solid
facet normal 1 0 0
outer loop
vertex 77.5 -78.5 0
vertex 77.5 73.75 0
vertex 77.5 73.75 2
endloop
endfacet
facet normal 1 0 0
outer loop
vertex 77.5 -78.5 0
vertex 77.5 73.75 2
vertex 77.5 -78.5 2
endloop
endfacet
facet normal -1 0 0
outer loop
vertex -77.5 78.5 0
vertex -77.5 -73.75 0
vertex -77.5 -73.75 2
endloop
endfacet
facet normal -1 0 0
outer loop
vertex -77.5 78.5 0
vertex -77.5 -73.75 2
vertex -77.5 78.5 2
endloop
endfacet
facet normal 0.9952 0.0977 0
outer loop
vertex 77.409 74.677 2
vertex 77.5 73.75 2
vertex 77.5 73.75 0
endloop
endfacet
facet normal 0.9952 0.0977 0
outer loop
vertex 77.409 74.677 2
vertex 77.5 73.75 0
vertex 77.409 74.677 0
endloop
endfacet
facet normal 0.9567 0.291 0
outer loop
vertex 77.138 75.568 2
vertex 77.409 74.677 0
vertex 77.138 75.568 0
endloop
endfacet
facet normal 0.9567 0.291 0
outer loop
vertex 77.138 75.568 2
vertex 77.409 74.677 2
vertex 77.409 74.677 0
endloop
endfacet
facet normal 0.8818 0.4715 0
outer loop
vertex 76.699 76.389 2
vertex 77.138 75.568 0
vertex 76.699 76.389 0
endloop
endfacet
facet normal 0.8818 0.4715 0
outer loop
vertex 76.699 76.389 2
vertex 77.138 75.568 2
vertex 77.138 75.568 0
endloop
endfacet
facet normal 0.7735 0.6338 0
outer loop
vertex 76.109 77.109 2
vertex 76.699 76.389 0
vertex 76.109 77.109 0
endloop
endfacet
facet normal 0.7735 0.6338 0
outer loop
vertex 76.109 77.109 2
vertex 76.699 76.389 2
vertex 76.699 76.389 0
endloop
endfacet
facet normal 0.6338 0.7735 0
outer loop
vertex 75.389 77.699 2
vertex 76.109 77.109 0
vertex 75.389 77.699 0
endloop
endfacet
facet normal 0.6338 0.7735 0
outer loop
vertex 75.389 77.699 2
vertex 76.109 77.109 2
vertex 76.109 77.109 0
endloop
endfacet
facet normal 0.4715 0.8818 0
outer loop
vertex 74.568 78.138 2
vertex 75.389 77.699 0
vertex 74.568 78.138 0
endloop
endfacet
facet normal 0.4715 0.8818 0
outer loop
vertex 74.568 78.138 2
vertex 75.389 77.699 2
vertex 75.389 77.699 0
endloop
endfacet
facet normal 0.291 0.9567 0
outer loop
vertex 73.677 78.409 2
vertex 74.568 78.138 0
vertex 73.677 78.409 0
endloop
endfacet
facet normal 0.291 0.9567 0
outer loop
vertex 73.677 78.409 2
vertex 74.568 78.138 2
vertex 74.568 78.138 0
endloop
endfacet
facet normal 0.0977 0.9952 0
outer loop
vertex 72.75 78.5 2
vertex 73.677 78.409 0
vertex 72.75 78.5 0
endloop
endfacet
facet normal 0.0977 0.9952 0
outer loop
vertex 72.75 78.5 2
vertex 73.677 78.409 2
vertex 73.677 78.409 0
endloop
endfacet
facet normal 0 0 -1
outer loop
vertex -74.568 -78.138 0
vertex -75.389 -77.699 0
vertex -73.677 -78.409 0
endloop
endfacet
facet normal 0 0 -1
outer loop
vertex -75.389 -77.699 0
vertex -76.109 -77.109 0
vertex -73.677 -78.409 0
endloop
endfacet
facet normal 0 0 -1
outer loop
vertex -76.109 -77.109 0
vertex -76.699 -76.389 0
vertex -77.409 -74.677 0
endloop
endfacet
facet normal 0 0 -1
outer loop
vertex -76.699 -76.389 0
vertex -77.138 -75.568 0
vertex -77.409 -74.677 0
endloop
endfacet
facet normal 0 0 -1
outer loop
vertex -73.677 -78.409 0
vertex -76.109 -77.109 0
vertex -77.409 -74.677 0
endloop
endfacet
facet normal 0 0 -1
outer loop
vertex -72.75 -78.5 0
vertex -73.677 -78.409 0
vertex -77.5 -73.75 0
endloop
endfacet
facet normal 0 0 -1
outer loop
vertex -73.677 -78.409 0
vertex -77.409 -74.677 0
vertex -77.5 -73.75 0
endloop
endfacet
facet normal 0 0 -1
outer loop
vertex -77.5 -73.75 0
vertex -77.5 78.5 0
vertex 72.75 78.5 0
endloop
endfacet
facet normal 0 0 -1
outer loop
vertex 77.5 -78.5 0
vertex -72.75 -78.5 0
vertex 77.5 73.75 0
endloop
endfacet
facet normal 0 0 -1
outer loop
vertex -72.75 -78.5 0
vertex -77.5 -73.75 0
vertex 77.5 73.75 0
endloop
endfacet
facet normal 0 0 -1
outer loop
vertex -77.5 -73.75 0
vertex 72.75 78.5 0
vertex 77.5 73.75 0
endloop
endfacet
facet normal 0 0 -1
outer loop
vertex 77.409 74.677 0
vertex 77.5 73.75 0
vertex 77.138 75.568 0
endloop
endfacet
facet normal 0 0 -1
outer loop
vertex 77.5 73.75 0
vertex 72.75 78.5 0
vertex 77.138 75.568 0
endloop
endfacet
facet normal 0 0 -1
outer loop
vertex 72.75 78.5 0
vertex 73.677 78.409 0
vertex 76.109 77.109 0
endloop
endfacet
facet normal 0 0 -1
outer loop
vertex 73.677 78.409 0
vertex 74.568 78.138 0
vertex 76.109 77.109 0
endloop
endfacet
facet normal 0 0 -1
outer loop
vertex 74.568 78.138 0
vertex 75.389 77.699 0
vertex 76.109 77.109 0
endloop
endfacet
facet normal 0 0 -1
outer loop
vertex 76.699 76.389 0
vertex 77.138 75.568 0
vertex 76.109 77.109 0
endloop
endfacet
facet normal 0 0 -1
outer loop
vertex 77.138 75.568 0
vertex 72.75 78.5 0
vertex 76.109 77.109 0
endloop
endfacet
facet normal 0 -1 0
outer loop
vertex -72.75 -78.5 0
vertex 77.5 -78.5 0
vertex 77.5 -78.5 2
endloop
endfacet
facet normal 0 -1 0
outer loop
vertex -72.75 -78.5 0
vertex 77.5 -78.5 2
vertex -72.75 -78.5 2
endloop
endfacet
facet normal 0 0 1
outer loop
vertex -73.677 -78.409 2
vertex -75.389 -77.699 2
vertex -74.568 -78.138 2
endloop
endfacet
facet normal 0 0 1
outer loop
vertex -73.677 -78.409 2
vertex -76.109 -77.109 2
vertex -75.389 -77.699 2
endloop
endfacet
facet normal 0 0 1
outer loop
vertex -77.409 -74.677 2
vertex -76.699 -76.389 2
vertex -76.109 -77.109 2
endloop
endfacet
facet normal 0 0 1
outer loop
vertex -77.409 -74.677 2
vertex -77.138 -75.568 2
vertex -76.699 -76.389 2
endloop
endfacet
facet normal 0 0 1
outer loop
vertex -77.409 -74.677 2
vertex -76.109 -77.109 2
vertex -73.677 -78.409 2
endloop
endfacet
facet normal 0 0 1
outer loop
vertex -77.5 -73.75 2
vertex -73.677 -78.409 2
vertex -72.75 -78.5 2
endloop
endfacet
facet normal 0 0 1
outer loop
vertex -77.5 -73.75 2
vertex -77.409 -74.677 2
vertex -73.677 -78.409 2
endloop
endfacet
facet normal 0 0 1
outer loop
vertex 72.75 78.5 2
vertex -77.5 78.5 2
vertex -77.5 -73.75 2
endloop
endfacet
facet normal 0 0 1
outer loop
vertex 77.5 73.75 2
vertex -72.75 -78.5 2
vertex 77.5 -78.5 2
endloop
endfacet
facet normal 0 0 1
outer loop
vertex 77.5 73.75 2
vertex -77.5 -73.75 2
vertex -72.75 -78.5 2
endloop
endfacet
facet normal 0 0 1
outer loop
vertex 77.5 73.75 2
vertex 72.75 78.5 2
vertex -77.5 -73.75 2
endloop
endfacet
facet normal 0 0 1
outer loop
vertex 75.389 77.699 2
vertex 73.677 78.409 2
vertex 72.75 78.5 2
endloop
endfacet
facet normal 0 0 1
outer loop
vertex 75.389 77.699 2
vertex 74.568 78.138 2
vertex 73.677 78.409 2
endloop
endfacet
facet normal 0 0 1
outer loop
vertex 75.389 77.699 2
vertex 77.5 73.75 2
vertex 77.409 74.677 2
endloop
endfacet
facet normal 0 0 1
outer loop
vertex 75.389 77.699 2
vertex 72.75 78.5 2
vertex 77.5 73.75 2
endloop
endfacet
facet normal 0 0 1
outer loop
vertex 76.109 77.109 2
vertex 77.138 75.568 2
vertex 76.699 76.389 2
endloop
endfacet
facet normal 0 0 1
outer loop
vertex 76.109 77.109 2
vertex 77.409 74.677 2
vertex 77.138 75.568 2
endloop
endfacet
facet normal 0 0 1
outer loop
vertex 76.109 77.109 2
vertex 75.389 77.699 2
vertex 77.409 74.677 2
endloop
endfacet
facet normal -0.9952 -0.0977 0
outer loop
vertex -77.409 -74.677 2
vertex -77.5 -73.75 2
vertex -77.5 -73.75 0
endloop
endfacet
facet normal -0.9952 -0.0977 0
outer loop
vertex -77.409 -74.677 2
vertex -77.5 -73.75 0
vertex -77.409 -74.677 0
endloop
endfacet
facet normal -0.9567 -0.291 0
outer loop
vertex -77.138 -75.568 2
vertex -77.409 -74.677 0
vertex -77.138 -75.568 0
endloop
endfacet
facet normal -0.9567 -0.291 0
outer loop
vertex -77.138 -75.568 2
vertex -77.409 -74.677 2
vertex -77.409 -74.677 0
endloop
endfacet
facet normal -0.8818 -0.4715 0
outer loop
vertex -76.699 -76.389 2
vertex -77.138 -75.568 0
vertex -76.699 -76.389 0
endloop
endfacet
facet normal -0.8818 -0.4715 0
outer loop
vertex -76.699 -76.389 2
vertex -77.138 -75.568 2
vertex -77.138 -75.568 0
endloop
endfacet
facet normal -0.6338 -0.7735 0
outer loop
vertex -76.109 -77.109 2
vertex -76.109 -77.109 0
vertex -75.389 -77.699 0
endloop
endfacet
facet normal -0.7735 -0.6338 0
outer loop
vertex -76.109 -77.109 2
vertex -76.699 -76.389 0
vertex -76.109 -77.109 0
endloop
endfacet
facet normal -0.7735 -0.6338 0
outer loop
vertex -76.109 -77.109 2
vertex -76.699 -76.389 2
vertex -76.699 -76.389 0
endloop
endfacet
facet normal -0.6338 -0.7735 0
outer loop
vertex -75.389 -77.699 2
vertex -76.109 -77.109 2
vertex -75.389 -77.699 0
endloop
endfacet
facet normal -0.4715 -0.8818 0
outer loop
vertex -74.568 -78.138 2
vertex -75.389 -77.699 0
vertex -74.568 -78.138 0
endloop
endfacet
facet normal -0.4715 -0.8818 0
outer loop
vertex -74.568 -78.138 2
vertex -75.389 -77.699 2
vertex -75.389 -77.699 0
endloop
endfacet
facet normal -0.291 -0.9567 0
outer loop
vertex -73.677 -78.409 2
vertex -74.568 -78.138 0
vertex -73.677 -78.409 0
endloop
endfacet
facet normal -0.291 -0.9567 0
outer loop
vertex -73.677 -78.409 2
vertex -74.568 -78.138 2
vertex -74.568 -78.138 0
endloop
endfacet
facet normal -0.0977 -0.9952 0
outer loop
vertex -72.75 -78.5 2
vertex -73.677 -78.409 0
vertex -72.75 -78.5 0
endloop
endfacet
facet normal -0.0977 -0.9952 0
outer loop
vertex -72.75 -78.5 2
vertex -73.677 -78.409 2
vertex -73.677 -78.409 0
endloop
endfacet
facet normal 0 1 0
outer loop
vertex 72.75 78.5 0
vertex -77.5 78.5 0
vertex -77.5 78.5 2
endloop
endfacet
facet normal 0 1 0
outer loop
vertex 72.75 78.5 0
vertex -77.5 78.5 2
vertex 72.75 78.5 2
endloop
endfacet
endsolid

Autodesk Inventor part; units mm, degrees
ref_plane "YZ Plane" through (0, 0, 0) normal (1, 0, 0) x (0, 1, 0)
ref_plane "XZ Plane" through (0, 0, 0) normal (0, 1, 0) x (-1, 0, 0)
ref_plane "XY Plane" through (0, 0, 0) normal (0, 0, 1) x (1, 0, 0)
sketch "Sketch1" plane through (0, 0, 0) normal (0, 0, 1) x (1, 0, 0)
  line L0 (-77.5, 78.5) -> (77.5, 78.5)
  line L1 (77.5, 78.5) -> (77.5, -78.5)
  line L2 (77.5, -78.5) -> (-77.5, -78.5)
  line L3 (-77.5, -78.5) -> (-77.5, 78.5)
  line L4 (-77.5, 78.5) -> (77.5, -78.5) construction
  point P0 (0, 0)
  point P1 (0, 0)
  dimension "d0" = 155
  dimension "d1" = 157
extrude "Plate1" add sketch "Sketch1" along normal blind 2
fillet "Corner Round1" radius 4.75 2 edges at (77.5, 78.5, 1) (-77.5, -78.5, 1)
equation "\"d2\" = Thickness"
equation "\"BendReliefWidth\" = Thickness"
equation "\"BendReliefDepth\" = 0.5 * Thickness"
equation "\"CornerReliefSize\" = 4 * Thickness"
equation "\"MinimumRemnant\" = 2 * Thickness"
equation "\"TransitionRadius\" = BendRadius"
equation "\"JacobiRadiusSize\" = BendRadius"
equation "\"GapSize\" = Thickness"
equation "\"Thickness\" = 2"
equation "\"BendRadius\" = 2.75"
properties part number "MNT-CDF-601 CAP" material "Stainless Steel"
